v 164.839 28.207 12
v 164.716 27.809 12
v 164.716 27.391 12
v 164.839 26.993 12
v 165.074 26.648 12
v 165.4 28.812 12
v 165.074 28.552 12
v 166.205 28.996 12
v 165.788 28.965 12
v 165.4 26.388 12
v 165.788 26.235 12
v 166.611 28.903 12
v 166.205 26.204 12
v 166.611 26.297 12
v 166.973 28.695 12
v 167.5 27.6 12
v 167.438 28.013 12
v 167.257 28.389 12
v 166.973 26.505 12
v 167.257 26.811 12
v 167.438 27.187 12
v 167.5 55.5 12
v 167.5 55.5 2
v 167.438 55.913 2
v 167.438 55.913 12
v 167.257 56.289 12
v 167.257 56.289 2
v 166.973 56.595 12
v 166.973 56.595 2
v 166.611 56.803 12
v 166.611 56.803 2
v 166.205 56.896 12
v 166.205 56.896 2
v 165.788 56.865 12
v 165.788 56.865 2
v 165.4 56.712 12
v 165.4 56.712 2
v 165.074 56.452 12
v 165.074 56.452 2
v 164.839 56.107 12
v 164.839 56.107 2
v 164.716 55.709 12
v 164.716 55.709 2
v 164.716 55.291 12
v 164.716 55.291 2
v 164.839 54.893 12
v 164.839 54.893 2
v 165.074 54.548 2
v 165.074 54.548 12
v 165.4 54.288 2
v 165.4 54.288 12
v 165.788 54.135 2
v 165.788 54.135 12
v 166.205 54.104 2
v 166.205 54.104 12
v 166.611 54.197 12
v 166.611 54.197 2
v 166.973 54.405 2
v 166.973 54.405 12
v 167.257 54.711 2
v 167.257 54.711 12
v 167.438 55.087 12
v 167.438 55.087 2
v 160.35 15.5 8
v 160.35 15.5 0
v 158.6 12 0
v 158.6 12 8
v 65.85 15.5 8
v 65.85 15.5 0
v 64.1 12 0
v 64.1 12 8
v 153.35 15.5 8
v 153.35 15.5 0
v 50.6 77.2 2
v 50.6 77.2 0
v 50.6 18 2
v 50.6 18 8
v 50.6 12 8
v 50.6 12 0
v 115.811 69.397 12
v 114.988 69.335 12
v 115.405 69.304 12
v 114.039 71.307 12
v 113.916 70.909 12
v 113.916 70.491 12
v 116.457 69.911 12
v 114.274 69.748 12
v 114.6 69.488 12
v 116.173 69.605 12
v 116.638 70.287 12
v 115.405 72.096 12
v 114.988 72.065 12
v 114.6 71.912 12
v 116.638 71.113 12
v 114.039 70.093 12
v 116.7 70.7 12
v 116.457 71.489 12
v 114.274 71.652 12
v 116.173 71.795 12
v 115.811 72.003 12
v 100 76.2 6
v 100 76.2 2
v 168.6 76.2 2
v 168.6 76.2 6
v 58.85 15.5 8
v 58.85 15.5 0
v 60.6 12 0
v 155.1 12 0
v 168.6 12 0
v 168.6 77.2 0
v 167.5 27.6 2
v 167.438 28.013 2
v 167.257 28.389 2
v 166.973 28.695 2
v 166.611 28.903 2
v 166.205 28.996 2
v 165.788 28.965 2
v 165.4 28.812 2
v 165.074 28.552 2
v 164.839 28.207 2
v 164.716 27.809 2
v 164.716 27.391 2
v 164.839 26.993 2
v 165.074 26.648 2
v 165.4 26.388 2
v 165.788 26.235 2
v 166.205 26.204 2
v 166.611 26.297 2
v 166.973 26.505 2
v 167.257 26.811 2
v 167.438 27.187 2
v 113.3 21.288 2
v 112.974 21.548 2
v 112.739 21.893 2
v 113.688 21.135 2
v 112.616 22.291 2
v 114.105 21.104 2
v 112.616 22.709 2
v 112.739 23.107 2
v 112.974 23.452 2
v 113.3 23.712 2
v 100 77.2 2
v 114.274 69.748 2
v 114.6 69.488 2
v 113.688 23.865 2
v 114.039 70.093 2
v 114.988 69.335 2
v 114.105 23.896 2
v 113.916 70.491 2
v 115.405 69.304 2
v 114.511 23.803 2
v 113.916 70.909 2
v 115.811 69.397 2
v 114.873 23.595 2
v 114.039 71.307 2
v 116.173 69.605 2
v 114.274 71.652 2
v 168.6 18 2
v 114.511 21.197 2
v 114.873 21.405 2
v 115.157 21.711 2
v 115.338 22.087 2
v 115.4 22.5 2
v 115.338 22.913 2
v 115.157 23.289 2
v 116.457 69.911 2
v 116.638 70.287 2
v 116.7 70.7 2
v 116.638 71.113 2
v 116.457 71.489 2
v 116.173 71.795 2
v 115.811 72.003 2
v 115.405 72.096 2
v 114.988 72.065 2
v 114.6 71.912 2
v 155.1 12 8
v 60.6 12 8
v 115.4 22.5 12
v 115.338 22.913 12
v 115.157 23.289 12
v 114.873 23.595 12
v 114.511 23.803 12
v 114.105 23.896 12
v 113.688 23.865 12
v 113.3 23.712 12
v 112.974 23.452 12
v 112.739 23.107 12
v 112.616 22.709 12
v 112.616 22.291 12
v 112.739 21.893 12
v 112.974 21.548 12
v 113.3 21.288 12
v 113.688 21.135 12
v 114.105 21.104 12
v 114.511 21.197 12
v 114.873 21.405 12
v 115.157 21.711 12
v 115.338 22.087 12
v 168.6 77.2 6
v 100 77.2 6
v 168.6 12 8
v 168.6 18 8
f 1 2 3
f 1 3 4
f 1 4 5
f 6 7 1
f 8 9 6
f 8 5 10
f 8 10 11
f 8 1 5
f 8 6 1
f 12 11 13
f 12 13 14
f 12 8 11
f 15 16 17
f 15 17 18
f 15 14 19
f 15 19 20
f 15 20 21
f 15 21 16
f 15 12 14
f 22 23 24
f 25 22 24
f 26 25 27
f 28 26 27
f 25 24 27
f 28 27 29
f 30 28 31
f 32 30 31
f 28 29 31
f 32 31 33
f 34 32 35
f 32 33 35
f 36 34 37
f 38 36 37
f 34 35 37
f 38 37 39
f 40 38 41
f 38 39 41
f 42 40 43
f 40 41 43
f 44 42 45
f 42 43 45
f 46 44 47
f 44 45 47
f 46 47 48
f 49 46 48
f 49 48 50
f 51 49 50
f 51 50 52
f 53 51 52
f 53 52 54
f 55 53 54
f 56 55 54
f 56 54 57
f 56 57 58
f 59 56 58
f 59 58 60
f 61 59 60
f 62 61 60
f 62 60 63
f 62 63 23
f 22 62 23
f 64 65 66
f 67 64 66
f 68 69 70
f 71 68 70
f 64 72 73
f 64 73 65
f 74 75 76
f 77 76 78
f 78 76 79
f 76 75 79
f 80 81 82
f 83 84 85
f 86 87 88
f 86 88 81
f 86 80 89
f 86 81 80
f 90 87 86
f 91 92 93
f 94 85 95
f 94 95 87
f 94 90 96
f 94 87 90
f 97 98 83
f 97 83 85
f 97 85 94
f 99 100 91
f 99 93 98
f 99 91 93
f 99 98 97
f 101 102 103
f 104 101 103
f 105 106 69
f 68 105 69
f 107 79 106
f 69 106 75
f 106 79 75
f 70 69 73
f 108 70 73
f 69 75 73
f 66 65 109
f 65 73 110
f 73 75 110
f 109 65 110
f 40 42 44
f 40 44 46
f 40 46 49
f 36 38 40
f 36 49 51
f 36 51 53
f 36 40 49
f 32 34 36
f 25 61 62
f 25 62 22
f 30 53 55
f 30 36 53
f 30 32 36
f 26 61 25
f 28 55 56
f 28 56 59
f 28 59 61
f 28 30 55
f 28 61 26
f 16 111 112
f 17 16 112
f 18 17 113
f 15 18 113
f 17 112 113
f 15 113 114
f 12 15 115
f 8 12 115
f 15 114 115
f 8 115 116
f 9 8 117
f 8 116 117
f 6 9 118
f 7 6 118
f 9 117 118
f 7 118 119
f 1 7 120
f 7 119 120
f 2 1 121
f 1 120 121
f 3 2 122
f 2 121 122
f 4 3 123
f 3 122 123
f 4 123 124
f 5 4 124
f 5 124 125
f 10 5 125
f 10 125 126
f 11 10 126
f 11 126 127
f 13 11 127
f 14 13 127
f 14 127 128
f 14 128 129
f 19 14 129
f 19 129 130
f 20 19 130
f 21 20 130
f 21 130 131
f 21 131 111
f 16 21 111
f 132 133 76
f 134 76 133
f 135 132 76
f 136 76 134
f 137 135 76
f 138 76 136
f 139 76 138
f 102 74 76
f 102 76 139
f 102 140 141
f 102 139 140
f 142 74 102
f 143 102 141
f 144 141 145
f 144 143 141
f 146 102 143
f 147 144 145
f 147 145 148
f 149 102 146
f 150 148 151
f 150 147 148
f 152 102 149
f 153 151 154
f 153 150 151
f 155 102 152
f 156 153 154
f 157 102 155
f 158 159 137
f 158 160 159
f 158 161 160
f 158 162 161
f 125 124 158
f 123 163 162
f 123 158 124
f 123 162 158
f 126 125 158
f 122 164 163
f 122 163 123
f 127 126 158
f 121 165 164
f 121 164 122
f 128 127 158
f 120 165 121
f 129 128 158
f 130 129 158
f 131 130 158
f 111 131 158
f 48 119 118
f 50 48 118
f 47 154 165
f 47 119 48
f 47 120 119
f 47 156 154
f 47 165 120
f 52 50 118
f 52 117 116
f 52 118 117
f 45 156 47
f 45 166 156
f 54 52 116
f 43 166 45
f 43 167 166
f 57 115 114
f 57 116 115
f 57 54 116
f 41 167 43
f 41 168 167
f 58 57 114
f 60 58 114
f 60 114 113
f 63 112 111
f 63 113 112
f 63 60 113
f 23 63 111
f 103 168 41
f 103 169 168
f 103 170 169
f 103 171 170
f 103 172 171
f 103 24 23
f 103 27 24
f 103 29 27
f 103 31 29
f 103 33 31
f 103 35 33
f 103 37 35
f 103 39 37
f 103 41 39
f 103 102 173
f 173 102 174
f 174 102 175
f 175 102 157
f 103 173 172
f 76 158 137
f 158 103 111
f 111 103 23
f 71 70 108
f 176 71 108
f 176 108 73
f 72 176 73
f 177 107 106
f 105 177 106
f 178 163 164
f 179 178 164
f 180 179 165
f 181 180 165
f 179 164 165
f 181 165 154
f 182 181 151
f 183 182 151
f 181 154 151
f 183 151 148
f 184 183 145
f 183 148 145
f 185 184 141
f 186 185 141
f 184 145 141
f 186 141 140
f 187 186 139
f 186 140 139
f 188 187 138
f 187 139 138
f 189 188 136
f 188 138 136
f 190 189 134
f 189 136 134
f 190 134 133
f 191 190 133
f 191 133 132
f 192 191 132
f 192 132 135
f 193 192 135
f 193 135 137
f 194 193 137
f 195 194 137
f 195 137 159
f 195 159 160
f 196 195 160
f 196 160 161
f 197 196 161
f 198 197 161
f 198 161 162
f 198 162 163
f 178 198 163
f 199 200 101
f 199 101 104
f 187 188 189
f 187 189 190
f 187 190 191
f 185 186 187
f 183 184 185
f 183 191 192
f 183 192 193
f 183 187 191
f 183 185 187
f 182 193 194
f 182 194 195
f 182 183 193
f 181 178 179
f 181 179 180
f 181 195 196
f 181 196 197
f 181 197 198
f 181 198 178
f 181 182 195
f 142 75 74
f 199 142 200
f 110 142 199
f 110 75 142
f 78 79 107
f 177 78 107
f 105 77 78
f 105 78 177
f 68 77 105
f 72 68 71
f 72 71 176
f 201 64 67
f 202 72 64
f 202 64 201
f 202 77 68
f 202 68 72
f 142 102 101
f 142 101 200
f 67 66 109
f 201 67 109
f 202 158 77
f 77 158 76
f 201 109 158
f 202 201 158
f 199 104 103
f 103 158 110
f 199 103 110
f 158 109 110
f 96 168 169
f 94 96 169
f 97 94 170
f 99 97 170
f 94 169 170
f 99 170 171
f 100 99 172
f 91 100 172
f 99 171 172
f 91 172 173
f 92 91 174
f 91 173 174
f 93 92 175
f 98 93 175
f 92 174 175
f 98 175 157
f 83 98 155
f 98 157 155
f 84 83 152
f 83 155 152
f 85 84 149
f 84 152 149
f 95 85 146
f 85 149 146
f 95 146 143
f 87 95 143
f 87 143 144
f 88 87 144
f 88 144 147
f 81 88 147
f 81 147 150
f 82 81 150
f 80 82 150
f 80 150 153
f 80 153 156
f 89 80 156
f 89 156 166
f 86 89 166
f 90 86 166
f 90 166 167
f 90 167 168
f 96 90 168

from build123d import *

# Parameters (mm, degrees)
F0_W     = 68.6
F0_H     = 53.2
F0_R     = 1.4
F0_H_2   = 3
F1_DEPTH = 2
F2_DEPTH = 12
F0_H_3   = 1
F3_DEPTH = 6
F4_DEPTH = 8


with BuildPart() as f1:
    # F0 (on Top) → F1 (new body)
    with BuildSketch(Plane.XY):
        with Locations((134.3, 46.6)):
            Rectangle(F0_W, F0_H)
        with Locations((114, 22.5)):
            Circle(F0_R, mode=Mode.SUBTRACT)
        with Locations((166.1, 27.6)):
            Circle(F0_R, mode=Mode.SUBTRACT)
        with Locations((166.1, 55.5)):
            Circle(F0_R, mode=Mode.SUBTRACT)
        with Locations((115.3, 70.7)):
            Circle(F0_R, mode=Mode.SUBTRACT)
        with Locations((134.3, 74.7)):
            Rectangle(F0_W, F0_H_2)
        Polygon((168.6, 20), (100, 20), (50.6, 20), (50.6, 18), (168.6, 18), align=None)
        Polygon((100, 20), (100, 73.2), (100, 76.2), (100, 77.2), (50.6, 77.2), (50.6, 20), align=None)
    extrude(amount=F1_DEPTH)

    # F0 (on Top) → F2 (join)
    with BuildSketch(Plane.XY):
        with Locations((115.3, 70.7)):
            Circle(F0_R)
        with Locations((166.1, 55.5)):
            Circle(F0_R)
        with Locations((166.1, 27.6)):
            Circle(F0_R)
        with Locations((114, 22.5)):
            Circle(F0_R)
    extrude(amount=F2_DEPTH)

    # F0 (on Top) → F3 (join)
    with BuildSketch(Plane.XY):
        with Locations((134.3, 76.7)):
            Rectangle(F0_W, F0_H_3)
    extrude(amount=F3_DEPTH)

    # F0 (on Top) → F4 (join)
    with BuildSketch(Plane.XY):
        Polygon((168.6, 12), (168.6, 18), (50.6, 18), (50.6, 12), (60.6, 12), (58.85, 15.5), (62.35, 15.5), (65.85, 15.5), (64.1, 12), (155.1, 12), (153.35, 15.5), (156.85, 15.5), (160.35, 15.5), (158.6, 12), align=None)
    extrude(amount=F4_DEPTH)


solid = f1.part
